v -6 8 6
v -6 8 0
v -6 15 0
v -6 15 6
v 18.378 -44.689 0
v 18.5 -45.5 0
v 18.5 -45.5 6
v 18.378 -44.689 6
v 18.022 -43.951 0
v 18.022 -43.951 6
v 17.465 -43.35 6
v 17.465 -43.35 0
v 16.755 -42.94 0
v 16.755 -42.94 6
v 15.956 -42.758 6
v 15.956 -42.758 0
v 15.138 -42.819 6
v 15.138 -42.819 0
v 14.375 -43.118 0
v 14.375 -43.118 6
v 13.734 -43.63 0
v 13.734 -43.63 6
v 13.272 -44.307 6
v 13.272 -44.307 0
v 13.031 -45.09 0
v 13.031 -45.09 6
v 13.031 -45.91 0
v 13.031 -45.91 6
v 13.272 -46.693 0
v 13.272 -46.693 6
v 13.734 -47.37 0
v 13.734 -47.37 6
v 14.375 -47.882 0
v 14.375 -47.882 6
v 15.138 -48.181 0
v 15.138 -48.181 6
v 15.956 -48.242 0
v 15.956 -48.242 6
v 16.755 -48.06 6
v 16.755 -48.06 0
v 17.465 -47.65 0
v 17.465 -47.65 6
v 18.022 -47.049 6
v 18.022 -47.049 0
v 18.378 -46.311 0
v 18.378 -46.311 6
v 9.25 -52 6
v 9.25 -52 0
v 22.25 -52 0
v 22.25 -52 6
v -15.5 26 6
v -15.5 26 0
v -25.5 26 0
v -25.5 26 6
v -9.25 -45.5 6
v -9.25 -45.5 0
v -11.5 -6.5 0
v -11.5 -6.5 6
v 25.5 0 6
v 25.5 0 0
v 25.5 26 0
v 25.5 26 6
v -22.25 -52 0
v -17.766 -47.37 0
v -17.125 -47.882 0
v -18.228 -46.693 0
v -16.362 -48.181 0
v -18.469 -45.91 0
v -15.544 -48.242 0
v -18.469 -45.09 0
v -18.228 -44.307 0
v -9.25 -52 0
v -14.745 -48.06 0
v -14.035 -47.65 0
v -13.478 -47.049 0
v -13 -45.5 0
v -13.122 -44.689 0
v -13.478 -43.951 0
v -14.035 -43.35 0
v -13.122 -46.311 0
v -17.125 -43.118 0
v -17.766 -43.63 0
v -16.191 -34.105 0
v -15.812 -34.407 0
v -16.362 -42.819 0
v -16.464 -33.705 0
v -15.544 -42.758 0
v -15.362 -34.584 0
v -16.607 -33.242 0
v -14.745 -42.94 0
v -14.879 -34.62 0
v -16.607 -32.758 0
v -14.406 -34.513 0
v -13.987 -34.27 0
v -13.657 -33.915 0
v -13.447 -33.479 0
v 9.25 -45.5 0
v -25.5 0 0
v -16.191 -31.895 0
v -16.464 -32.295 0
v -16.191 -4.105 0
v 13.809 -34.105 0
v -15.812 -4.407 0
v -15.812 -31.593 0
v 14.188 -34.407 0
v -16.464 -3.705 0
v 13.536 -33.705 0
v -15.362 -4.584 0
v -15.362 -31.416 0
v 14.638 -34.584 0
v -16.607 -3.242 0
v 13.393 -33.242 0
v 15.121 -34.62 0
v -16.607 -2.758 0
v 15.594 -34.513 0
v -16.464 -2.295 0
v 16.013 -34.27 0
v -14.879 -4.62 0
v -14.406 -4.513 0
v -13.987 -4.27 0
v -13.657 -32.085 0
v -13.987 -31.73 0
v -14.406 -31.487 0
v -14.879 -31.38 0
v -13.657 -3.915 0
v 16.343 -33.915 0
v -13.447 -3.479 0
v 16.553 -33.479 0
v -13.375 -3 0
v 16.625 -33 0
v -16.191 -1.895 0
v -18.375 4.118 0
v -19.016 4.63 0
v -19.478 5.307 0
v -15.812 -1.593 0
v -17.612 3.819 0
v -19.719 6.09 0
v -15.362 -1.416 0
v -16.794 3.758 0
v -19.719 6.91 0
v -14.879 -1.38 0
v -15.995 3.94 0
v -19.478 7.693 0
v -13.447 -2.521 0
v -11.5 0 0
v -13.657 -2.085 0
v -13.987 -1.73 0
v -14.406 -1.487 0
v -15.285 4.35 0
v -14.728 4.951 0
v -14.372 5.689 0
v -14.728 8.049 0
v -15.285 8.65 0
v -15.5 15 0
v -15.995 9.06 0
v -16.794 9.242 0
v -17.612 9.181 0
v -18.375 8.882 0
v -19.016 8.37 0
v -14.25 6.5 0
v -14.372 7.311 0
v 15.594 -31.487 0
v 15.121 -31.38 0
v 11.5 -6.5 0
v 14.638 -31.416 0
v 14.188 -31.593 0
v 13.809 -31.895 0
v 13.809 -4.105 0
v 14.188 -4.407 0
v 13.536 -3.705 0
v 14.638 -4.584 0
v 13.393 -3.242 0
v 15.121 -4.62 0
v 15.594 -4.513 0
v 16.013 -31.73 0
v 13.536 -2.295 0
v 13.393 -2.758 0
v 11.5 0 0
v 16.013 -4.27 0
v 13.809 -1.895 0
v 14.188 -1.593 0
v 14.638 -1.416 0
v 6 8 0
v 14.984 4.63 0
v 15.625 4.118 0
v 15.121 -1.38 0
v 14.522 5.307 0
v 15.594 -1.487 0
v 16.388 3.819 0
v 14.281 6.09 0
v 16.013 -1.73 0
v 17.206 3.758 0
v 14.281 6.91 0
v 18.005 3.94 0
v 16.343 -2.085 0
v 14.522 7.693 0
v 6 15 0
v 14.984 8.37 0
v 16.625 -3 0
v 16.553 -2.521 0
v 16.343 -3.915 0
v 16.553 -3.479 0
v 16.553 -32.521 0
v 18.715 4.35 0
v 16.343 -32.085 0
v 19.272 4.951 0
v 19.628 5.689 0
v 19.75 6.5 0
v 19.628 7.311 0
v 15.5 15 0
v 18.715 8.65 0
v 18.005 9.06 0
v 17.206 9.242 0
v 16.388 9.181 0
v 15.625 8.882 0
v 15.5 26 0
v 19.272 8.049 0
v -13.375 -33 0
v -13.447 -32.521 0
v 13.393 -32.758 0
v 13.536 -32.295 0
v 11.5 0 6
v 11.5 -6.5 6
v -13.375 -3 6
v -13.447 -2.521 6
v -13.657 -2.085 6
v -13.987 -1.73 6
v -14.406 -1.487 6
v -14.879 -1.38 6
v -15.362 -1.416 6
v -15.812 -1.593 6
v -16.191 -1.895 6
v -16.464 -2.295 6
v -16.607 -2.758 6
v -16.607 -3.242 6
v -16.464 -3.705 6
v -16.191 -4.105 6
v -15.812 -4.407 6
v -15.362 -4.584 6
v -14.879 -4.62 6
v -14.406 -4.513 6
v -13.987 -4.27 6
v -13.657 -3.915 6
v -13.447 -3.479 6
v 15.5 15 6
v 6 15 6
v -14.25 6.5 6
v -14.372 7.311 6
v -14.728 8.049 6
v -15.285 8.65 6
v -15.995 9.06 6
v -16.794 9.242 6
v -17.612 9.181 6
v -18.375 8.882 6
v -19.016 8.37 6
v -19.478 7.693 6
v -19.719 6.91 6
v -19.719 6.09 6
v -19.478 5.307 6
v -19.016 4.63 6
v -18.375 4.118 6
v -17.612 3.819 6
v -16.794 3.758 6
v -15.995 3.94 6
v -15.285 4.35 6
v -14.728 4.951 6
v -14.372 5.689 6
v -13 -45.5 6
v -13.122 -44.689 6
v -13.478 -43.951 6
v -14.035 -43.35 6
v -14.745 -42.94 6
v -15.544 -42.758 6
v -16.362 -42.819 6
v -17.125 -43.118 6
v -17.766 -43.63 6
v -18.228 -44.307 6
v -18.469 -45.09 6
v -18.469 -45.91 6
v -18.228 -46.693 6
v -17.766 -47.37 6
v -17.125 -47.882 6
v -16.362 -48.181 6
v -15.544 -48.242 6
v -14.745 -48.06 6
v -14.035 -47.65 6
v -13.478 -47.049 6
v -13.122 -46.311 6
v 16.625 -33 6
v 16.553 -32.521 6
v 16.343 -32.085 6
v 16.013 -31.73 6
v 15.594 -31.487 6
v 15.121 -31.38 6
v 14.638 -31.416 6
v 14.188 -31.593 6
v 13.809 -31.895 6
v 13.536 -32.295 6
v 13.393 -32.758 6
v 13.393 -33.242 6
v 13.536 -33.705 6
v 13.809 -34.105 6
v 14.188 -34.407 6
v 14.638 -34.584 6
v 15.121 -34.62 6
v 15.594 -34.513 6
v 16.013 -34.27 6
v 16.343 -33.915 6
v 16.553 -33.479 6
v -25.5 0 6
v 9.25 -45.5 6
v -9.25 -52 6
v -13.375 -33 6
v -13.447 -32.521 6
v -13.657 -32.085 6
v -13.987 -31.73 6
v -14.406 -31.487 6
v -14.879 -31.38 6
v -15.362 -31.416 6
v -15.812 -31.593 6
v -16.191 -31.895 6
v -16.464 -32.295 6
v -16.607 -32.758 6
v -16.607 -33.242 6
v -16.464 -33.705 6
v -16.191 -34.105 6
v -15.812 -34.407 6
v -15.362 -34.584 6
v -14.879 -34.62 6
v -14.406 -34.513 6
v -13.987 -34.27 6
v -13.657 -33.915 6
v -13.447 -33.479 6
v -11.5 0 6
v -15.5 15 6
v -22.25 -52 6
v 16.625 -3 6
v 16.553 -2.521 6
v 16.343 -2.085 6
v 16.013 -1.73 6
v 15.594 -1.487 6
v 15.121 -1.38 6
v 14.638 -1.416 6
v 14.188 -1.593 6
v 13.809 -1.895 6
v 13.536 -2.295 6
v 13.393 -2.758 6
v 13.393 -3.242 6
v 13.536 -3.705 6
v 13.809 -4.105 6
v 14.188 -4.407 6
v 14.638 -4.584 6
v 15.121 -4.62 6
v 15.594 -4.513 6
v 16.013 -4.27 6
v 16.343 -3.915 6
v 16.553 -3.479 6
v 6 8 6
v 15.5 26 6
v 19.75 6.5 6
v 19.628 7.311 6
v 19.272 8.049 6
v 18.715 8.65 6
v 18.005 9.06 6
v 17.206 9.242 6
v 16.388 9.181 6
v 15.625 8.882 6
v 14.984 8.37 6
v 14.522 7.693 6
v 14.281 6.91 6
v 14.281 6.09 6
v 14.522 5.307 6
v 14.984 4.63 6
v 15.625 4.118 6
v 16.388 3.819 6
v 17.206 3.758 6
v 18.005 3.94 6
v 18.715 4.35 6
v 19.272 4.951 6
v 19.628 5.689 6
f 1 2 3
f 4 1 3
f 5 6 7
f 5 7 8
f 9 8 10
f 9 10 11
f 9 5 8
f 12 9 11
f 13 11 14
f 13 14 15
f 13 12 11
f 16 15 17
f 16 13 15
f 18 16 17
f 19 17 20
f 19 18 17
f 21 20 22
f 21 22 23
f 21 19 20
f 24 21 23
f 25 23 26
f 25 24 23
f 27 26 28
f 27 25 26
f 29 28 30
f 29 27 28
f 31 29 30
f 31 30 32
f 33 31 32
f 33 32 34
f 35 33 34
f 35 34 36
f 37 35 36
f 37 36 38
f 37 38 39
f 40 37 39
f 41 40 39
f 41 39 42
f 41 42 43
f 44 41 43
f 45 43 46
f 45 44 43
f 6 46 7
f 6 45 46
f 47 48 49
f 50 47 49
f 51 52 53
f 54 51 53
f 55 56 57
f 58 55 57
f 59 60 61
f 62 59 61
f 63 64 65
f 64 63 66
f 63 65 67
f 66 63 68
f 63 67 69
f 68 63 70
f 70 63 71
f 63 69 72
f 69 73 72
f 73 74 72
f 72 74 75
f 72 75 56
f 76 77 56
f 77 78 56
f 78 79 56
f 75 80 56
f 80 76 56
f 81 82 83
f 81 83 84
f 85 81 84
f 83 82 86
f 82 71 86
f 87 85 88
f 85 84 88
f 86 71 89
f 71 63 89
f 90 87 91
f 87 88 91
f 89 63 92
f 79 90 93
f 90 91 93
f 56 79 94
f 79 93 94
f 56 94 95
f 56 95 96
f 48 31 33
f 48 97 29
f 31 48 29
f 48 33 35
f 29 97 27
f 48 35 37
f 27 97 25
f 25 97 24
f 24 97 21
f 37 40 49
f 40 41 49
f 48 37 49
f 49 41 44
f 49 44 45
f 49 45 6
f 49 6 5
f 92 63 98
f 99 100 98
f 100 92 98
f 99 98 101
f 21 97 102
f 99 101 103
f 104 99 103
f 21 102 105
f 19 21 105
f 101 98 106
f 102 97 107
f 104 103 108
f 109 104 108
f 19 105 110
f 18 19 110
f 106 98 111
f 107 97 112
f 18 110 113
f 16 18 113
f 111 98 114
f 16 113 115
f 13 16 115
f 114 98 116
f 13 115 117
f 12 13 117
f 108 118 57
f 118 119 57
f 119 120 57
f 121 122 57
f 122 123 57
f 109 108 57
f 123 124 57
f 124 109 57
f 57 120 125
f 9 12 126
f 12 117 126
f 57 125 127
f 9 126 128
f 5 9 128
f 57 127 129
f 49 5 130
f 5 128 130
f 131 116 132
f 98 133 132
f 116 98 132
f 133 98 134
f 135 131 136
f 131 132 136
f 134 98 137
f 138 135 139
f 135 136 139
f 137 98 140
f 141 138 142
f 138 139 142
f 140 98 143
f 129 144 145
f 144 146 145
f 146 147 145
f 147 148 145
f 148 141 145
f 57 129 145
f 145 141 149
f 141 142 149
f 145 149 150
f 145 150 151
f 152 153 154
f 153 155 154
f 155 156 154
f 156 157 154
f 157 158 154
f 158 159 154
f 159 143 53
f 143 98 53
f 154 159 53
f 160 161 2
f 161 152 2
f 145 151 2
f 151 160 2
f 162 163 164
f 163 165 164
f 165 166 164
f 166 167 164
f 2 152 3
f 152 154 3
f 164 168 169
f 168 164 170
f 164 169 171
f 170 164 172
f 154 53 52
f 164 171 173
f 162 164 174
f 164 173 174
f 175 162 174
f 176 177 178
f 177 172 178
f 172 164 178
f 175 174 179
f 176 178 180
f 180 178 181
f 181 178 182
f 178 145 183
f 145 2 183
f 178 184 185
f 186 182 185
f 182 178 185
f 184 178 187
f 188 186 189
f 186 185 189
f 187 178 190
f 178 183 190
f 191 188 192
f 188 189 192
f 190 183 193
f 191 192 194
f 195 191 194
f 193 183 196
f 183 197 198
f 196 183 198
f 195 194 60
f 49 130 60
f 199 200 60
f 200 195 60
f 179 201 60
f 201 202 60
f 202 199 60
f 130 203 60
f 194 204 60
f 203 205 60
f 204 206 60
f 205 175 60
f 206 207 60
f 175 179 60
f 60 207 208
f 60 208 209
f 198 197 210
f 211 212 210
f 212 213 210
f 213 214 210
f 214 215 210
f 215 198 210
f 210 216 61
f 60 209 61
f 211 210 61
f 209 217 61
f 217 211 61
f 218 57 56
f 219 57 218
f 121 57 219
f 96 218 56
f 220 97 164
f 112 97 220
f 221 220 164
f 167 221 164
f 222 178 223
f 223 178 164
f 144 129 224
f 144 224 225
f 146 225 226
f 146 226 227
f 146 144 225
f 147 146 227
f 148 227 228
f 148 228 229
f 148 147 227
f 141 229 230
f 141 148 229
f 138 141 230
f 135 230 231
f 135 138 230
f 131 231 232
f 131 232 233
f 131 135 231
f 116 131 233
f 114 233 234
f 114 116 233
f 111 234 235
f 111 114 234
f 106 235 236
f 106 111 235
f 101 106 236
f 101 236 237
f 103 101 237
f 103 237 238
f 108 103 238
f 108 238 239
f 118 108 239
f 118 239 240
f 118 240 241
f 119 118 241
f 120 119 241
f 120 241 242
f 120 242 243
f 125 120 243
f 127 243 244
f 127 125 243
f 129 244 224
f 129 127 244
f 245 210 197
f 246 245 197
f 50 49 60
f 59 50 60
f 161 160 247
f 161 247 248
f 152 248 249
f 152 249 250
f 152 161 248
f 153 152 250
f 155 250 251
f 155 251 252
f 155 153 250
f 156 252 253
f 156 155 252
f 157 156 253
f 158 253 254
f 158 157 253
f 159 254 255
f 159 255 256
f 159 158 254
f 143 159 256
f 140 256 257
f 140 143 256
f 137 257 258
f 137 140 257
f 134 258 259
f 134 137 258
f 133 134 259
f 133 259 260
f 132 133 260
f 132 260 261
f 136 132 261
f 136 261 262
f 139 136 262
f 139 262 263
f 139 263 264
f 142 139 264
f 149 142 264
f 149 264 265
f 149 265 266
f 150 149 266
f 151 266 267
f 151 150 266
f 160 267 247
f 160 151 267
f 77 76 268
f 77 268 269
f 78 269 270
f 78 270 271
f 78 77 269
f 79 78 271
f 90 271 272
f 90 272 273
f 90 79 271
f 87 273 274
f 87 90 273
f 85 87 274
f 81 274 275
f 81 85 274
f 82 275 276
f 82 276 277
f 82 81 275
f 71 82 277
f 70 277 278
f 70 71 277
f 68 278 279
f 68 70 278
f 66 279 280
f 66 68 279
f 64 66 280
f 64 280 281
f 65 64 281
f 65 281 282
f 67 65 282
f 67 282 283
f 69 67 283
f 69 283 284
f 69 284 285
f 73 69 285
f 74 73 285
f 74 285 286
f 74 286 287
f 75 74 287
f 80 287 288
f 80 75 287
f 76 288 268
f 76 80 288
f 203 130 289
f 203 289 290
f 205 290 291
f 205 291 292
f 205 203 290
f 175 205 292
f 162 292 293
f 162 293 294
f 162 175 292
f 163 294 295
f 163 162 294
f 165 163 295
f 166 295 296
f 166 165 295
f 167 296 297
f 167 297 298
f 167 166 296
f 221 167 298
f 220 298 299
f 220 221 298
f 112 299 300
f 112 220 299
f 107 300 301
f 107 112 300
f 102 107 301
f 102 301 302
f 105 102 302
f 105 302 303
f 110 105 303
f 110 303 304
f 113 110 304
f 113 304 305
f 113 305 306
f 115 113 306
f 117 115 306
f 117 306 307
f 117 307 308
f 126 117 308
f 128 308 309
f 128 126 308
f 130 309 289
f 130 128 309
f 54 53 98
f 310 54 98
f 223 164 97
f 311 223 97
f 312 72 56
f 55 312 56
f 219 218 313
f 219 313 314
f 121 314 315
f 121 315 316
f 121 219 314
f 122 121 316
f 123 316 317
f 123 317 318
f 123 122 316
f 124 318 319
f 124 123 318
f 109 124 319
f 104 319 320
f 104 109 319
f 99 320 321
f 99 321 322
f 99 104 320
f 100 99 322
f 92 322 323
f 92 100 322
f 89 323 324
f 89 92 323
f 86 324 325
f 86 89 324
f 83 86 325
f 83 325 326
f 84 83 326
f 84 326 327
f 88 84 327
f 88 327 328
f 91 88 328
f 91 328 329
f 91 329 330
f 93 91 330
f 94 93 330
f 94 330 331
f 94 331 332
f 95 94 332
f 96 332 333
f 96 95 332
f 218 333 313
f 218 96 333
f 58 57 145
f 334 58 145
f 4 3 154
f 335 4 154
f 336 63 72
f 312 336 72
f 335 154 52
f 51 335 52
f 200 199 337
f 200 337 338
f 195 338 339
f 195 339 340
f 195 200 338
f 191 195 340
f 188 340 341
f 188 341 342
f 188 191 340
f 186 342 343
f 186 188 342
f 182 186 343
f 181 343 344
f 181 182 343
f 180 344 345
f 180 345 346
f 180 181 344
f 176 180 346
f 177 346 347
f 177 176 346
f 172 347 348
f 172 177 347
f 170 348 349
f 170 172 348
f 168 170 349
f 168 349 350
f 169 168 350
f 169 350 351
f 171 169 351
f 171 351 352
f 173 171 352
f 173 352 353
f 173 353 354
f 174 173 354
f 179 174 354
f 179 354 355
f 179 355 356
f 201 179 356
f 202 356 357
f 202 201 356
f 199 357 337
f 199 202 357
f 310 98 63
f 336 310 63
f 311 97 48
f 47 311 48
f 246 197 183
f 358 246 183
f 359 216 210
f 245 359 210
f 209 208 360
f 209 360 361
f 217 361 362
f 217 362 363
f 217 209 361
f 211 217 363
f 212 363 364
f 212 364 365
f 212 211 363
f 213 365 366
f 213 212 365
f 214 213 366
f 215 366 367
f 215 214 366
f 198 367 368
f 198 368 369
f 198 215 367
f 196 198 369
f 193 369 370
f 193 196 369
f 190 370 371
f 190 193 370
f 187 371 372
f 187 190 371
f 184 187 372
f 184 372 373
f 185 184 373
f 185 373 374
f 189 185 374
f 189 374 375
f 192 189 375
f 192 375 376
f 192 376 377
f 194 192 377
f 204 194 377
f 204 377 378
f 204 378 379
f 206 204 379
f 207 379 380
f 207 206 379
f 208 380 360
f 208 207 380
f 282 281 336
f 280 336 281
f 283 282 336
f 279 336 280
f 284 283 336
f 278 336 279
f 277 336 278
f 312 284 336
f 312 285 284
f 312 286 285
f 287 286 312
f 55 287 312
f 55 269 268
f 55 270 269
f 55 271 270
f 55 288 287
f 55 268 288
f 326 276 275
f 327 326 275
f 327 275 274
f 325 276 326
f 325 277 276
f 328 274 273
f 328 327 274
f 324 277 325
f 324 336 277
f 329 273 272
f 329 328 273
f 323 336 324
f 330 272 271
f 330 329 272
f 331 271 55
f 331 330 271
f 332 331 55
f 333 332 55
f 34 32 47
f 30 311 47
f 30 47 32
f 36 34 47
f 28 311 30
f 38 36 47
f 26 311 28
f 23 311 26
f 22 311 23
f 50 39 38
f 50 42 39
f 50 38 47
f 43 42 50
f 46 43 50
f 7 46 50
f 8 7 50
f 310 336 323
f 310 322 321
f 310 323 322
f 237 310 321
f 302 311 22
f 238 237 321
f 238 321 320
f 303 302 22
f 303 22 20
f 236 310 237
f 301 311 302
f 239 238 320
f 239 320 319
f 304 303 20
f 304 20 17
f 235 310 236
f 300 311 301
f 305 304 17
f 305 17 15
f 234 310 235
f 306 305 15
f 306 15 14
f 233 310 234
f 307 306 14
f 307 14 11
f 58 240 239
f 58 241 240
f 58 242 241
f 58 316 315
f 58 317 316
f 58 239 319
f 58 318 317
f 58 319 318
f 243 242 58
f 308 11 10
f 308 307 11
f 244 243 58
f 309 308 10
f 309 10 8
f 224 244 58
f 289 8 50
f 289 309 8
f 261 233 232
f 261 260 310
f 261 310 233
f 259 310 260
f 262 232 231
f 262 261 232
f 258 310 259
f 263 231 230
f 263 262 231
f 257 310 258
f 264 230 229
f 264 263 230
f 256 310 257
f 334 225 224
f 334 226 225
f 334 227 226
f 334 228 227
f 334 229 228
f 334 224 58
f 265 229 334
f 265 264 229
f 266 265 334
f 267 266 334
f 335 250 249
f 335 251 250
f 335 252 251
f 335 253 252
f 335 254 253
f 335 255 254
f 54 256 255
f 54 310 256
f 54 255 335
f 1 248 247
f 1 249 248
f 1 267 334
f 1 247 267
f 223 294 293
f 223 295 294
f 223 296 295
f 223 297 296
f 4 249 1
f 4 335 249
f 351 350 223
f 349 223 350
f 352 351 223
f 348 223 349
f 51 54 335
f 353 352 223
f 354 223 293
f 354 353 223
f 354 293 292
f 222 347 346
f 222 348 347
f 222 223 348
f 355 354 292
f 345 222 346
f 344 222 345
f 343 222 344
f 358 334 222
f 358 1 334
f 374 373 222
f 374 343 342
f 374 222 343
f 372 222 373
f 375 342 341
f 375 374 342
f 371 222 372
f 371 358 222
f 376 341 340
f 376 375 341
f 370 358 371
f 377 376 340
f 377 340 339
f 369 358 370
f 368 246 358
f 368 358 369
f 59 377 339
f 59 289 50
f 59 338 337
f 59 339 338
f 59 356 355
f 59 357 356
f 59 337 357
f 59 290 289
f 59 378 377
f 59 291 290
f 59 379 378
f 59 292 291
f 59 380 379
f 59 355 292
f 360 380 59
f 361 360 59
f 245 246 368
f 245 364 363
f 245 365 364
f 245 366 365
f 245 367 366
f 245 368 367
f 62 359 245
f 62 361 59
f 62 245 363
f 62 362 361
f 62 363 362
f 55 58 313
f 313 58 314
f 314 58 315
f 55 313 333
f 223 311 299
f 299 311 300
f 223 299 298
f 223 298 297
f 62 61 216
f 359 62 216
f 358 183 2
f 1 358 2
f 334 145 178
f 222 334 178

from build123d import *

# Parameters (mm, degrees)
F0_R     = 2.75
F0_R_2   = 1.625
F1_DEPTH = 6


with BuildPart() as f1:
    # F0 (on Top) → F1 (new body)
    with BuildSketch(Plane.XY):
        Polygon((-6, 15), (-15.5, 15), (-15.5, 26), (-25.5, 26), (-25.5, 15), (-25.5, 0), (-22.25, -52), (-9.25, -52), (-9.25, -45.5), (-11.5, -6.5), (-11.5, 0), (11.5, 0), (11.5, -6.5), (9.25, -45.5), (9.25, -52), (22.25, -52), (25.5, 0), (25.5, 15), (25.5, 26), (15.5, 26), (15.5, 15), (6, 15), (6, 8), (-6, 8), align=None)
        with Locations((-15.75, -45.5)):
            Circle(F0_R, mode=Mode.SUBTRACT)
        with Locations((-15, -33)):
            Circle(F0_R_2, mode=Mode.SUBTRACT)
        with Locations((15.75, -45.5)):
            Circle(F0_R, mode=Mode.SUBTRACT)
        with Locations((15, -33)):
            Circle(F0_R_2, mode=Mode.SUBTRACT)
        with Locations((-15, -3)):
            Circle(F0_R_2, mode=Mode.SUBTRACT)
        with Locations((-17, 6.5)):
            Circle(F0_R, mode=Mode.SUBTRACT)
        with Locations((15, -3)):
            Circle(F0_R_2, mode=Mode.SUBTRACT)
        with Locations((17, 6.5)):
            Circle(F0_R, mode=Mode.SUBTRACT)
    extrude(amount=F1_DEPTH)


solid = f1.part
